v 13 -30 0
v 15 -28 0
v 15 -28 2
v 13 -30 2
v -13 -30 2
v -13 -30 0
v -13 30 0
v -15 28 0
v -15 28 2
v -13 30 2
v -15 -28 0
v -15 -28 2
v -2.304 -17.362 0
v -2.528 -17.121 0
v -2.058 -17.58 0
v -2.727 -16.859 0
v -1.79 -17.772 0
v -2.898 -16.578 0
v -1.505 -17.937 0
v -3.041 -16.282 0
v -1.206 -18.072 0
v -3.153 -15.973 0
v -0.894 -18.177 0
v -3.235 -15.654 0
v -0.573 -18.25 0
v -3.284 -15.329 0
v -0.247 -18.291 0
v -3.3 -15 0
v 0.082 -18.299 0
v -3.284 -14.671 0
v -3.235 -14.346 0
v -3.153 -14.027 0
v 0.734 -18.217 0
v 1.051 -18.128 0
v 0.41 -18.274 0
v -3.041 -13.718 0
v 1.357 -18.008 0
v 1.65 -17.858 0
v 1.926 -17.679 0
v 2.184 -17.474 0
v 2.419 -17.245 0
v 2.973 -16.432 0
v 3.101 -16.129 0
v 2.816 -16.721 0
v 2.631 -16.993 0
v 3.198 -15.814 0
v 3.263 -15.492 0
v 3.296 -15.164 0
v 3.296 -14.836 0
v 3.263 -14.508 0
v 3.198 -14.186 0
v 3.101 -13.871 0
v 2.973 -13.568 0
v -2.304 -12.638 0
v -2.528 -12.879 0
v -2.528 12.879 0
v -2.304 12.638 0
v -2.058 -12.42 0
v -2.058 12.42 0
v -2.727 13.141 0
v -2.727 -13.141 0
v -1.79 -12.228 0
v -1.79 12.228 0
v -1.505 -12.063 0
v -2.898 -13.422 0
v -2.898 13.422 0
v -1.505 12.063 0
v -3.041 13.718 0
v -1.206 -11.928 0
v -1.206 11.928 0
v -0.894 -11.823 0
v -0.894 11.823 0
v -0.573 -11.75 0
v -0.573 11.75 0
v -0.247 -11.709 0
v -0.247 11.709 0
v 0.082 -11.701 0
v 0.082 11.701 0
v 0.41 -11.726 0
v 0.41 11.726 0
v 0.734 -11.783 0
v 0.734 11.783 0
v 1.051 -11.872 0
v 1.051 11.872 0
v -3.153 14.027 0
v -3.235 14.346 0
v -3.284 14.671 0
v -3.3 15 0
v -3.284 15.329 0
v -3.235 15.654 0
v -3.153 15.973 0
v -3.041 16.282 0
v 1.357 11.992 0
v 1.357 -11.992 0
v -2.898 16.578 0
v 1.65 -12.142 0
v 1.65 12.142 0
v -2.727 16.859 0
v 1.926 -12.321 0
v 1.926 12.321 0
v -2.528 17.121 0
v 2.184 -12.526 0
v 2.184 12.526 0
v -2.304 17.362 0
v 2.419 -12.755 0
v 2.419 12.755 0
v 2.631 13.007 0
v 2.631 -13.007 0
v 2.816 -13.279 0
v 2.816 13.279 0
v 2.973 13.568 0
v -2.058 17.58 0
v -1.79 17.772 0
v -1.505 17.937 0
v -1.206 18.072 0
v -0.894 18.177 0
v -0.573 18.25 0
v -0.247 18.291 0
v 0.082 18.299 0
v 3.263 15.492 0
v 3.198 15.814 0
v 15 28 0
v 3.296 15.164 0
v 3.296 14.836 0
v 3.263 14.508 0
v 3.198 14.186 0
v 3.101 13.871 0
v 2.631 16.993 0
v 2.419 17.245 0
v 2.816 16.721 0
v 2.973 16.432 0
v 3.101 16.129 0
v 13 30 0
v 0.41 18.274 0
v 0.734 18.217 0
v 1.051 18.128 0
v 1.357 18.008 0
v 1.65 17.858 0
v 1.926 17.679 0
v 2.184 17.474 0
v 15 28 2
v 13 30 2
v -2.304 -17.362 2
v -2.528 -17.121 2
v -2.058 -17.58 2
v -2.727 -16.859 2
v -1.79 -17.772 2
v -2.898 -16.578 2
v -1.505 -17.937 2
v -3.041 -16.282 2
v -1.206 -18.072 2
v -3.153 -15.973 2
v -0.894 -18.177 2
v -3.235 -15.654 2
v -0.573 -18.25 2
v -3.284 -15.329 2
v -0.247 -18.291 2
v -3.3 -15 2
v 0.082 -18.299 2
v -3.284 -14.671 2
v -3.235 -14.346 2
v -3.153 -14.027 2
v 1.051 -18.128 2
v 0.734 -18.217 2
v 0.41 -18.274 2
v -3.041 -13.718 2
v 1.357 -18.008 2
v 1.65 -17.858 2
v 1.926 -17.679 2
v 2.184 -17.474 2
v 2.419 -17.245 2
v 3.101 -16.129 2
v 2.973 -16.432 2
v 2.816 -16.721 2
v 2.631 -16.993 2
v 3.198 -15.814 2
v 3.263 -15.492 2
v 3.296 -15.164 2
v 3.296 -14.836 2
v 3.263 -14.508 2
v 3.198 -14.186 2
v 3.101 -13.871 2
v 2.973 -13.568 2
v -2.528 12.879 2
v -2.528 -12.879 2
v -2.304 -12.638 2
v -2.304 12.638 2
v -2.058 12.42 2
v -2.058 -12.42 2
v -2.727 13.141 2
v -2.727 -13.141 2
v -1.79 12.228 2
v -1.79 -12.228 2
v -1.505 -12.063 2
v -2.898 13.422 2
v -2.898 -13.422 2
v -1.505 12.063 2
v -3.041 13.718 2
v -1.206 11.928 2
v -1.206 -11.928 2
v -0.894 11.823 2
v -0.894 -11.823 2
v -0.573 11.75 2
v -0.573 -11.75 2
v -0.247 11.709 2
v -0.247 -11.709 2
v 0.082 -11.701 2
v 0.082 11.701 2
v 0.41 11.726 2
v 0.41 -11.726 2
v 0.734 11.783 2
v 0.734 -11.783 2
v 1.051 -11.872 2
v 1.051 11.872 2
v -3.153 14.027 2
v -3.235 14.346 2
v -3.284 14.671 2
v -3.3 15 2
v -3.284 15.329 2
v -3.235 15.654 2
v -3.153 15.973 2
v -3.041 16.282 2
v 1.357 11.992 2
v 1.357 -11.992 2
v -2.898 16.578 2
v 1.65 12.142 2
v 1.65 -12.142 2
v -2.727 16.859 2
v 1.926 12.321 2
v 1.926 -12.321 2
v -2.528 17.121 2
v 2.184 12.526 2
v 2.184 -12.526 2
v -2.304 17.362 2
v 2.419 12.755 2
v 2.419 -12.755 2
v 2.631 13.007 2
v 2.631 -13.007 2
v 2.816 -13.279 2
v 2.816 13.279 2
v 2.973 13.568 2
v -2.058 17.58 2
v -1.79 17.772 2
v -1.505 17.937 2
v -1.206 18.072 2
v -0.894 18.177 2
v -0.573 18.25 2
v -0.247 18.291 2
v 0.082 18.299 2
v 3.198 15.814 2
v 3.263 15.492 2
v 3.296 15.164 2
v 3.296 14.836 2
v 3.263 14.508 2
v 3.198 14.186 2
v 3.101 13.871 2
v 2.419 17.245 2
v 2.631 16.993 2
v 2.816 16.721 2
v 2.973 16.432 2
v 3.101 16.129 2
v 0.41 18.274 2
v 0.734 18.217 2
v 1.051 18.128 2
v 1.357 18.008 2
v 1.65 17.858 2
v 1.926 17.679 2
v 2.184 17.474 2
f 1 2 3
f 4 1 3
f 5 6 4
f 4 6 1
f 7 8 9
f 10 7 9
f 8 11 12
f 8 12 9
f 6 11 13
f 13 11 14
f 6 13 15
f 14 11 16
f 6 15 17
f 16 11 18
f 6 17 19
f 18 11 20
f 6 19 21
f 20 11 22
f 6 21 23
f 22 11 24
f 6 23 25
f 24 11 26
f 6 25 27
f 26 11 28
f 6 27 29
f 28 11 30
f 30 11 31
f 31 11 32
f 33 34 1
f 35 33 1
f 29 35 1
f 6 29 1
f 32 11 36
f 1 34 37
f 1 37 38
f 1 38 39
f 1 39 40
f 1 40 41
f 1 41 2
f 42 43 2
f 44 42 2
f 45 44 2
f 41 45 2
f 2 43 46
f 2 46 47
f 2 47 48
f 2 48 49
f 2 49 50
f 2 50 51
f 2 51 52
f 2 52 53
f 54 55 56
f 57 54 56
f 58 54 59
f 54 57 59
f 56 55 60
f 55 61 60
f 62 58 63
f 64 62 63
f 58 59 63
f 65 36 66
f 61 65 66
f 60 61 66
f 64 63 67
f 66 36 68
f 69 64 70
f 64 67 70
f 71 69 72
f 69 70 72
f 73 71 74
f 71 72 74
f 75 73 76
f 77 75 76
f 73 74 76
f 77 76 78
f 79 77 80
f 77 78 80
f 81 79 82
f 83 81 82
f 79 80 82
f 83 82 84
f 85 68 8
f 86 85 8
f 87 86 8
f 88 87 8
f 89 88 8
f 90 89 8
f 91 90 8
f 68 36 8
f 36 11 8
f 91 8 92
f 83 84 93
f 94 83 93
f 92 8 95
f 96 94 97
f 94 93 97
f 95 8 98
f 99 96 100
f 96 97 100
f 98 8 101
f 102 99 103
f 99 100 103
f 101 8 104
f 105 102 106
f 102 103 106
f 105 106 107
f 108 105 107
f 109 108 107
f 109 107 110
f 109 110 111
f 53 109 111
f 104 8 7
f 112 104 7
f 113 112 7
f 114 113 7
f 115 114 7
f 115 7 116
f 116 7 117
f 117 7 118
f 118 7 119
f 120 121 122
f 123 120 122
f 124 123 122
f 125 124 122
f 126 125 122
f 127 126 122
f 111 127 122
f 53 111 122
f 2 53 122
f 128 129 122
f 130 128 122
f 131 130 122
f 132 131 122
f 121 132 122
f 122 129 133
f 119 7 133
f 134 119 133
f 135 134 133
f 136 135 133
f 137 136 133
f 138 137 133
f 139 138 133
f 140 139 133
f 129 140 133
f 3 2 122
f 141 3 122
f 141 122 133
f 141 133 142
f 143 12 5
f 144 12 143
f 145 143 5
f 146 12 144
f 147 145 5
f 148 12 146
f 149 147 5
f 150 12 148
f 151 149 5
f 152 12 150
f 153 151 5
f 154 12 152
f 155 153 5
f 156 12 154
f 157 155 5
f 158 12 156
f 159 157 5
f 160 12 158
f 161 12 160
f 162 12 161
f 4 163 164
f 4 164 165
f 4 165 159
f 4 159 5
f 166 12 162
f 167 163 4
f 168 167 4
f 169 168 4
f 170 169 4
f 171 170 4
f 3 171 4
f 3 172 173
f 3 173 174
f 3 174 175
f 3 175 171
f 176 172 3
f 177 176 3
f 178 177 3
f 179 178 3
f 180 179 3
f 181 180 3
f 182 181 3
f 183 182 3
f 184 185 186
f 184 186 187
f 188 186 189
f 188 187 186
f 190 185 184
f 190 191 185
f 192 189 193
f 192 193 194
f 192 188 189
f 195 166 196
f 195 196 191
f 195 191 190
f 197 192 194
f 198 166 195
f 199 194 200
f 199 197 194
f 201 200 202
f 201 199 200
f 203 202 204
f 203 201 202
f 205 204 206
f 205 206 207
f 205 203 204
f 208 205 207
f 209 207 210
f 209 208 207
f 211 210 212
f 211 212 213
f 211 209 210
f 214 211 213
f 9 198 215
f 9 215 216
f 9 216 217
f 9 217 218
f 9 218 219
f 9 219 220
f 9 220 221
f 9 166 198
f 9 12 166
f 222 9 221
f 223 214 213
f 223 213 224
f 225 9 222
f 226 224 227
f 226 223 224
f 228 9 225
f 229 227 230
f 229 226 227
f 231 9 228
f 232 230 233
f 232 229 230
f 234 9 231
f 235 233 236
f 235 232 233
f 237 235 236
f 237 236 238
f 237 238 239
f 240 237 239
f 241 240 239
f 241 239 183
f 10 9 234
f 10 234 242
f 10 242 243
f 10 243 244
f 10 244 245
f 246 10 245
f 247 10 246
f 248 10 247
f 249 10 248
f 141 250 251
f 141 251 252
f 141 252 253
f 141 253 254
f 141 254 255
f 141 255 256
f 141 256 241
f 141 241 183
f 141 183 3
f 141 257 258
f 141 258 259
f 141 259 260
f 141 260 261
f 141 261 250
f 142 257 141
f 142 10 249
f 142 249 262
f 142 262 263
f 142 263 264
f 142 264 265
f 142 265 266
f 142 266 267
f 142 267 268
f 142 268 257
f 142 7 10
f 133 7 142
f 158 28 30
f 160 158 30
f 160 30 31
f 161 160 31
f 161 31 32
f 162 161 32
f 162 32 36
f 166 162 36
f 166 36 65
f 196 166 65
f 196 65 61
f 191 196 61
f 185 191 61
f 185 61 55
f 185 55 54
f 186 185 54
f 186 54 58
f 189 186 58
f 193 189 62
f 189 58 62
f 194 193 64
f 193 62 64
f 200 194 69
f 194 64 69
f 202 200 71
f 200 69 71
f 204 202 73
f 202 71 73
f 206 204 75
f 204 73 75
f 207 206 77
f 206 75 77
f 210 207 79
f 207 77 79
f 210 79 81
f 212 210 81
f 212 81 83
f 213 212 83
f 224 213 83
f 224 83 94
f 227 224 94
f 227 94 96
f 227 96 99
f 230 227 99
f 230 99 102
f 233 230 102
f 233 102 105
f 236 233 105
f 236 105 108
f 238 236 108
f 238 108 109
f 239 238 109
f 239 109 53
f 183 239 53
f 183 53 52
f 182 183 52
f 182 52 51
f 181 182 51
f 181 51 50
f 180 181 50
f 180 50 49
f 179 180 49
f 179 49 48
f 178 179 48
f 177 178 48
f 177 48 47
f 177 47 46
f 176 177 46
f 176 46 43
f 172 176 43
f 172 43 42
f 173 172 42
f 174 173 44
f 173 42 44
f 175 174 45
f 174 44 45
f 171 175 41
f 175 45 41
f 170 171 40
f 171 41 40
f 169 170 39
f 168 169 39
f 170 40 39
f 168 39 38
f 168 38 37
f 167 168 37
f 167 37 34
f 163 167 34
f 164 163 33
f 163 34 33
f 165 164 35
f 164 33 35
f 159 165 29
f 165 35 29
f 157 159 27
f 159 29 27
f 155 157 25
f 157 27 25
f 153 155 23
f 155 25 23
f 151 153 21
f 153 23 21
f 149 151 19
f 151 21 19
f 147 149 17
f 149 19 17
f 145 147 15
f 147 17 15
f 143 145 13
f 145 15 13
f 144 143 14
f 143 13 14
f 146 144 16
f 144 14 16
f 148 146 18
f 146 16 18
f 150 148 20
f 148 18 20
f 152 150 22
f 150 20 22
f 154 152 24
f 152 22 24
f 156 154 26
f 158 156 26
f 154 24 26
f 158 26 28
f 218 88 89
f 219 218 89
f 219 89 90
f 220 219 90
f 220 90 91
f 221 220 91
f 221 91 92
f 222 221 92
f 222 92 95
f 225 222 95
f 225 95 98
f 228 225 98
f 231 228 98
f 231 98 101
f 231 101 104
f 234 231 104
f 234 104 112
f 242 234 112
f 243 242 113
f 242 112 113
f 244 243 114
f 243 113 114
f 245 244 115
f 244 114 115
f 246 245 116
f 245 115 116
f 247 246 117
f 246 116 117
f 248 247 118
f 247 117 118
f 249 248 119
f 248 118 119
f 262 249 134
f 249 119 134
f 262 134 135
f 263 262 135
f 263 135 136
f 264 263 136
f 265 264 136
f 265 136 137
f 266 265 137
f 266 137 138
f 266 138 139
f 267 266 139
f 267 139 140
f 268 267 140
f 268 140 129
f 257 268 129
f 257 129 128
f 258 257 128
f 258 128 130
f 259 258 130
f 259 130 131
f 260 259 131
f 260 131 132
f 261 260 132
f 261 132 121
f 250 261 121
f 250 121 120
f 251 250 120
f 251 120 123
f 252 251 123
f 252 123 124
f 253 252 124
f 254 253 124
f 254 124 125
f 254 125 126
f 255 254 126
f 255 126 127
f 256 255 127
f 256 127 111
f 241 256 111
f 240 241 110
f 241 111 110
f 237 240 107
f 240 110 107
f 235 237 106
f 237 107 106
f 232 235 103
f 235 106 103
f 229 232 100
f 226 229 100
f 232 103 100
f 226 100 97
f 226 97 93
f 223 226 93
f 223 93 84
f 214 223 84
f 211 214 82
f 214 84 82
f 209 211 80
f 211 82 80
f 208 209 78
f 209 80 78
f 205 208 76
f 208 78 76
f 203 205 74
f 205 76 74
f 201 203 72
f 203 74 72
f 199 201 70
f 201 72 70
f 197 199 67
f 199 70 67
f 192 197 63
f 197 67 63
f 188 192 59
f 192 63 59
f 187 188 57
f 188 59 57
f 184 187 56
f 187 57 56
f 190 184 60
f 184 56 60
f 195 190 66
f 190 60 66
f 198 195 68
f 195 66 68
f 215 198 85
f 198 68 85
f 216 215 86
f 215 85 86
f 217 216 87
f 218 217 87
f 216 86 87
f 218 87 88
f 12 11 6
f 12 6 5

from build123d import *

# Parameters (mm, degrees)
SKETCH_1_W        = 30
SKETCH_1_H        = 60
EXTRUDE_1_DEPTH   = 2
CHAMFER_1_SIZE    = 2
HOLE_WIZARD_M61_D = 6.6


with BuildPart() as part:
    # Эскиз1 → Бобышка-Вытянуть1 (new body)
    with BuildSketch(Plane.XY):
        Rectangle(SKETCH_1_W, SKETCH_1_H)
    extrude(amount=EXTRUDE_1_DEPTH)

    # Фаска1
    chamfer_1_edges = [part.edges().sort_by_distance(p)[0] for p in [
        (15, -30, 1),
        (-15, -30, 1),
        (-15, 30, 1),
        (15, 30, 1),
    ]]
    chamfer(chamfer_1_edges, length=CHAMFER_1_SIZE)

    # Отверстие с зазором M61 (through all)
    with Locations(Plane.XY.offset(2)):
        with Locations((0, -45), (0, 45), (0, 15), (0, -15)):
            Hole(HOLE_WIZARD_M61_D / 2)


solid = part.part
